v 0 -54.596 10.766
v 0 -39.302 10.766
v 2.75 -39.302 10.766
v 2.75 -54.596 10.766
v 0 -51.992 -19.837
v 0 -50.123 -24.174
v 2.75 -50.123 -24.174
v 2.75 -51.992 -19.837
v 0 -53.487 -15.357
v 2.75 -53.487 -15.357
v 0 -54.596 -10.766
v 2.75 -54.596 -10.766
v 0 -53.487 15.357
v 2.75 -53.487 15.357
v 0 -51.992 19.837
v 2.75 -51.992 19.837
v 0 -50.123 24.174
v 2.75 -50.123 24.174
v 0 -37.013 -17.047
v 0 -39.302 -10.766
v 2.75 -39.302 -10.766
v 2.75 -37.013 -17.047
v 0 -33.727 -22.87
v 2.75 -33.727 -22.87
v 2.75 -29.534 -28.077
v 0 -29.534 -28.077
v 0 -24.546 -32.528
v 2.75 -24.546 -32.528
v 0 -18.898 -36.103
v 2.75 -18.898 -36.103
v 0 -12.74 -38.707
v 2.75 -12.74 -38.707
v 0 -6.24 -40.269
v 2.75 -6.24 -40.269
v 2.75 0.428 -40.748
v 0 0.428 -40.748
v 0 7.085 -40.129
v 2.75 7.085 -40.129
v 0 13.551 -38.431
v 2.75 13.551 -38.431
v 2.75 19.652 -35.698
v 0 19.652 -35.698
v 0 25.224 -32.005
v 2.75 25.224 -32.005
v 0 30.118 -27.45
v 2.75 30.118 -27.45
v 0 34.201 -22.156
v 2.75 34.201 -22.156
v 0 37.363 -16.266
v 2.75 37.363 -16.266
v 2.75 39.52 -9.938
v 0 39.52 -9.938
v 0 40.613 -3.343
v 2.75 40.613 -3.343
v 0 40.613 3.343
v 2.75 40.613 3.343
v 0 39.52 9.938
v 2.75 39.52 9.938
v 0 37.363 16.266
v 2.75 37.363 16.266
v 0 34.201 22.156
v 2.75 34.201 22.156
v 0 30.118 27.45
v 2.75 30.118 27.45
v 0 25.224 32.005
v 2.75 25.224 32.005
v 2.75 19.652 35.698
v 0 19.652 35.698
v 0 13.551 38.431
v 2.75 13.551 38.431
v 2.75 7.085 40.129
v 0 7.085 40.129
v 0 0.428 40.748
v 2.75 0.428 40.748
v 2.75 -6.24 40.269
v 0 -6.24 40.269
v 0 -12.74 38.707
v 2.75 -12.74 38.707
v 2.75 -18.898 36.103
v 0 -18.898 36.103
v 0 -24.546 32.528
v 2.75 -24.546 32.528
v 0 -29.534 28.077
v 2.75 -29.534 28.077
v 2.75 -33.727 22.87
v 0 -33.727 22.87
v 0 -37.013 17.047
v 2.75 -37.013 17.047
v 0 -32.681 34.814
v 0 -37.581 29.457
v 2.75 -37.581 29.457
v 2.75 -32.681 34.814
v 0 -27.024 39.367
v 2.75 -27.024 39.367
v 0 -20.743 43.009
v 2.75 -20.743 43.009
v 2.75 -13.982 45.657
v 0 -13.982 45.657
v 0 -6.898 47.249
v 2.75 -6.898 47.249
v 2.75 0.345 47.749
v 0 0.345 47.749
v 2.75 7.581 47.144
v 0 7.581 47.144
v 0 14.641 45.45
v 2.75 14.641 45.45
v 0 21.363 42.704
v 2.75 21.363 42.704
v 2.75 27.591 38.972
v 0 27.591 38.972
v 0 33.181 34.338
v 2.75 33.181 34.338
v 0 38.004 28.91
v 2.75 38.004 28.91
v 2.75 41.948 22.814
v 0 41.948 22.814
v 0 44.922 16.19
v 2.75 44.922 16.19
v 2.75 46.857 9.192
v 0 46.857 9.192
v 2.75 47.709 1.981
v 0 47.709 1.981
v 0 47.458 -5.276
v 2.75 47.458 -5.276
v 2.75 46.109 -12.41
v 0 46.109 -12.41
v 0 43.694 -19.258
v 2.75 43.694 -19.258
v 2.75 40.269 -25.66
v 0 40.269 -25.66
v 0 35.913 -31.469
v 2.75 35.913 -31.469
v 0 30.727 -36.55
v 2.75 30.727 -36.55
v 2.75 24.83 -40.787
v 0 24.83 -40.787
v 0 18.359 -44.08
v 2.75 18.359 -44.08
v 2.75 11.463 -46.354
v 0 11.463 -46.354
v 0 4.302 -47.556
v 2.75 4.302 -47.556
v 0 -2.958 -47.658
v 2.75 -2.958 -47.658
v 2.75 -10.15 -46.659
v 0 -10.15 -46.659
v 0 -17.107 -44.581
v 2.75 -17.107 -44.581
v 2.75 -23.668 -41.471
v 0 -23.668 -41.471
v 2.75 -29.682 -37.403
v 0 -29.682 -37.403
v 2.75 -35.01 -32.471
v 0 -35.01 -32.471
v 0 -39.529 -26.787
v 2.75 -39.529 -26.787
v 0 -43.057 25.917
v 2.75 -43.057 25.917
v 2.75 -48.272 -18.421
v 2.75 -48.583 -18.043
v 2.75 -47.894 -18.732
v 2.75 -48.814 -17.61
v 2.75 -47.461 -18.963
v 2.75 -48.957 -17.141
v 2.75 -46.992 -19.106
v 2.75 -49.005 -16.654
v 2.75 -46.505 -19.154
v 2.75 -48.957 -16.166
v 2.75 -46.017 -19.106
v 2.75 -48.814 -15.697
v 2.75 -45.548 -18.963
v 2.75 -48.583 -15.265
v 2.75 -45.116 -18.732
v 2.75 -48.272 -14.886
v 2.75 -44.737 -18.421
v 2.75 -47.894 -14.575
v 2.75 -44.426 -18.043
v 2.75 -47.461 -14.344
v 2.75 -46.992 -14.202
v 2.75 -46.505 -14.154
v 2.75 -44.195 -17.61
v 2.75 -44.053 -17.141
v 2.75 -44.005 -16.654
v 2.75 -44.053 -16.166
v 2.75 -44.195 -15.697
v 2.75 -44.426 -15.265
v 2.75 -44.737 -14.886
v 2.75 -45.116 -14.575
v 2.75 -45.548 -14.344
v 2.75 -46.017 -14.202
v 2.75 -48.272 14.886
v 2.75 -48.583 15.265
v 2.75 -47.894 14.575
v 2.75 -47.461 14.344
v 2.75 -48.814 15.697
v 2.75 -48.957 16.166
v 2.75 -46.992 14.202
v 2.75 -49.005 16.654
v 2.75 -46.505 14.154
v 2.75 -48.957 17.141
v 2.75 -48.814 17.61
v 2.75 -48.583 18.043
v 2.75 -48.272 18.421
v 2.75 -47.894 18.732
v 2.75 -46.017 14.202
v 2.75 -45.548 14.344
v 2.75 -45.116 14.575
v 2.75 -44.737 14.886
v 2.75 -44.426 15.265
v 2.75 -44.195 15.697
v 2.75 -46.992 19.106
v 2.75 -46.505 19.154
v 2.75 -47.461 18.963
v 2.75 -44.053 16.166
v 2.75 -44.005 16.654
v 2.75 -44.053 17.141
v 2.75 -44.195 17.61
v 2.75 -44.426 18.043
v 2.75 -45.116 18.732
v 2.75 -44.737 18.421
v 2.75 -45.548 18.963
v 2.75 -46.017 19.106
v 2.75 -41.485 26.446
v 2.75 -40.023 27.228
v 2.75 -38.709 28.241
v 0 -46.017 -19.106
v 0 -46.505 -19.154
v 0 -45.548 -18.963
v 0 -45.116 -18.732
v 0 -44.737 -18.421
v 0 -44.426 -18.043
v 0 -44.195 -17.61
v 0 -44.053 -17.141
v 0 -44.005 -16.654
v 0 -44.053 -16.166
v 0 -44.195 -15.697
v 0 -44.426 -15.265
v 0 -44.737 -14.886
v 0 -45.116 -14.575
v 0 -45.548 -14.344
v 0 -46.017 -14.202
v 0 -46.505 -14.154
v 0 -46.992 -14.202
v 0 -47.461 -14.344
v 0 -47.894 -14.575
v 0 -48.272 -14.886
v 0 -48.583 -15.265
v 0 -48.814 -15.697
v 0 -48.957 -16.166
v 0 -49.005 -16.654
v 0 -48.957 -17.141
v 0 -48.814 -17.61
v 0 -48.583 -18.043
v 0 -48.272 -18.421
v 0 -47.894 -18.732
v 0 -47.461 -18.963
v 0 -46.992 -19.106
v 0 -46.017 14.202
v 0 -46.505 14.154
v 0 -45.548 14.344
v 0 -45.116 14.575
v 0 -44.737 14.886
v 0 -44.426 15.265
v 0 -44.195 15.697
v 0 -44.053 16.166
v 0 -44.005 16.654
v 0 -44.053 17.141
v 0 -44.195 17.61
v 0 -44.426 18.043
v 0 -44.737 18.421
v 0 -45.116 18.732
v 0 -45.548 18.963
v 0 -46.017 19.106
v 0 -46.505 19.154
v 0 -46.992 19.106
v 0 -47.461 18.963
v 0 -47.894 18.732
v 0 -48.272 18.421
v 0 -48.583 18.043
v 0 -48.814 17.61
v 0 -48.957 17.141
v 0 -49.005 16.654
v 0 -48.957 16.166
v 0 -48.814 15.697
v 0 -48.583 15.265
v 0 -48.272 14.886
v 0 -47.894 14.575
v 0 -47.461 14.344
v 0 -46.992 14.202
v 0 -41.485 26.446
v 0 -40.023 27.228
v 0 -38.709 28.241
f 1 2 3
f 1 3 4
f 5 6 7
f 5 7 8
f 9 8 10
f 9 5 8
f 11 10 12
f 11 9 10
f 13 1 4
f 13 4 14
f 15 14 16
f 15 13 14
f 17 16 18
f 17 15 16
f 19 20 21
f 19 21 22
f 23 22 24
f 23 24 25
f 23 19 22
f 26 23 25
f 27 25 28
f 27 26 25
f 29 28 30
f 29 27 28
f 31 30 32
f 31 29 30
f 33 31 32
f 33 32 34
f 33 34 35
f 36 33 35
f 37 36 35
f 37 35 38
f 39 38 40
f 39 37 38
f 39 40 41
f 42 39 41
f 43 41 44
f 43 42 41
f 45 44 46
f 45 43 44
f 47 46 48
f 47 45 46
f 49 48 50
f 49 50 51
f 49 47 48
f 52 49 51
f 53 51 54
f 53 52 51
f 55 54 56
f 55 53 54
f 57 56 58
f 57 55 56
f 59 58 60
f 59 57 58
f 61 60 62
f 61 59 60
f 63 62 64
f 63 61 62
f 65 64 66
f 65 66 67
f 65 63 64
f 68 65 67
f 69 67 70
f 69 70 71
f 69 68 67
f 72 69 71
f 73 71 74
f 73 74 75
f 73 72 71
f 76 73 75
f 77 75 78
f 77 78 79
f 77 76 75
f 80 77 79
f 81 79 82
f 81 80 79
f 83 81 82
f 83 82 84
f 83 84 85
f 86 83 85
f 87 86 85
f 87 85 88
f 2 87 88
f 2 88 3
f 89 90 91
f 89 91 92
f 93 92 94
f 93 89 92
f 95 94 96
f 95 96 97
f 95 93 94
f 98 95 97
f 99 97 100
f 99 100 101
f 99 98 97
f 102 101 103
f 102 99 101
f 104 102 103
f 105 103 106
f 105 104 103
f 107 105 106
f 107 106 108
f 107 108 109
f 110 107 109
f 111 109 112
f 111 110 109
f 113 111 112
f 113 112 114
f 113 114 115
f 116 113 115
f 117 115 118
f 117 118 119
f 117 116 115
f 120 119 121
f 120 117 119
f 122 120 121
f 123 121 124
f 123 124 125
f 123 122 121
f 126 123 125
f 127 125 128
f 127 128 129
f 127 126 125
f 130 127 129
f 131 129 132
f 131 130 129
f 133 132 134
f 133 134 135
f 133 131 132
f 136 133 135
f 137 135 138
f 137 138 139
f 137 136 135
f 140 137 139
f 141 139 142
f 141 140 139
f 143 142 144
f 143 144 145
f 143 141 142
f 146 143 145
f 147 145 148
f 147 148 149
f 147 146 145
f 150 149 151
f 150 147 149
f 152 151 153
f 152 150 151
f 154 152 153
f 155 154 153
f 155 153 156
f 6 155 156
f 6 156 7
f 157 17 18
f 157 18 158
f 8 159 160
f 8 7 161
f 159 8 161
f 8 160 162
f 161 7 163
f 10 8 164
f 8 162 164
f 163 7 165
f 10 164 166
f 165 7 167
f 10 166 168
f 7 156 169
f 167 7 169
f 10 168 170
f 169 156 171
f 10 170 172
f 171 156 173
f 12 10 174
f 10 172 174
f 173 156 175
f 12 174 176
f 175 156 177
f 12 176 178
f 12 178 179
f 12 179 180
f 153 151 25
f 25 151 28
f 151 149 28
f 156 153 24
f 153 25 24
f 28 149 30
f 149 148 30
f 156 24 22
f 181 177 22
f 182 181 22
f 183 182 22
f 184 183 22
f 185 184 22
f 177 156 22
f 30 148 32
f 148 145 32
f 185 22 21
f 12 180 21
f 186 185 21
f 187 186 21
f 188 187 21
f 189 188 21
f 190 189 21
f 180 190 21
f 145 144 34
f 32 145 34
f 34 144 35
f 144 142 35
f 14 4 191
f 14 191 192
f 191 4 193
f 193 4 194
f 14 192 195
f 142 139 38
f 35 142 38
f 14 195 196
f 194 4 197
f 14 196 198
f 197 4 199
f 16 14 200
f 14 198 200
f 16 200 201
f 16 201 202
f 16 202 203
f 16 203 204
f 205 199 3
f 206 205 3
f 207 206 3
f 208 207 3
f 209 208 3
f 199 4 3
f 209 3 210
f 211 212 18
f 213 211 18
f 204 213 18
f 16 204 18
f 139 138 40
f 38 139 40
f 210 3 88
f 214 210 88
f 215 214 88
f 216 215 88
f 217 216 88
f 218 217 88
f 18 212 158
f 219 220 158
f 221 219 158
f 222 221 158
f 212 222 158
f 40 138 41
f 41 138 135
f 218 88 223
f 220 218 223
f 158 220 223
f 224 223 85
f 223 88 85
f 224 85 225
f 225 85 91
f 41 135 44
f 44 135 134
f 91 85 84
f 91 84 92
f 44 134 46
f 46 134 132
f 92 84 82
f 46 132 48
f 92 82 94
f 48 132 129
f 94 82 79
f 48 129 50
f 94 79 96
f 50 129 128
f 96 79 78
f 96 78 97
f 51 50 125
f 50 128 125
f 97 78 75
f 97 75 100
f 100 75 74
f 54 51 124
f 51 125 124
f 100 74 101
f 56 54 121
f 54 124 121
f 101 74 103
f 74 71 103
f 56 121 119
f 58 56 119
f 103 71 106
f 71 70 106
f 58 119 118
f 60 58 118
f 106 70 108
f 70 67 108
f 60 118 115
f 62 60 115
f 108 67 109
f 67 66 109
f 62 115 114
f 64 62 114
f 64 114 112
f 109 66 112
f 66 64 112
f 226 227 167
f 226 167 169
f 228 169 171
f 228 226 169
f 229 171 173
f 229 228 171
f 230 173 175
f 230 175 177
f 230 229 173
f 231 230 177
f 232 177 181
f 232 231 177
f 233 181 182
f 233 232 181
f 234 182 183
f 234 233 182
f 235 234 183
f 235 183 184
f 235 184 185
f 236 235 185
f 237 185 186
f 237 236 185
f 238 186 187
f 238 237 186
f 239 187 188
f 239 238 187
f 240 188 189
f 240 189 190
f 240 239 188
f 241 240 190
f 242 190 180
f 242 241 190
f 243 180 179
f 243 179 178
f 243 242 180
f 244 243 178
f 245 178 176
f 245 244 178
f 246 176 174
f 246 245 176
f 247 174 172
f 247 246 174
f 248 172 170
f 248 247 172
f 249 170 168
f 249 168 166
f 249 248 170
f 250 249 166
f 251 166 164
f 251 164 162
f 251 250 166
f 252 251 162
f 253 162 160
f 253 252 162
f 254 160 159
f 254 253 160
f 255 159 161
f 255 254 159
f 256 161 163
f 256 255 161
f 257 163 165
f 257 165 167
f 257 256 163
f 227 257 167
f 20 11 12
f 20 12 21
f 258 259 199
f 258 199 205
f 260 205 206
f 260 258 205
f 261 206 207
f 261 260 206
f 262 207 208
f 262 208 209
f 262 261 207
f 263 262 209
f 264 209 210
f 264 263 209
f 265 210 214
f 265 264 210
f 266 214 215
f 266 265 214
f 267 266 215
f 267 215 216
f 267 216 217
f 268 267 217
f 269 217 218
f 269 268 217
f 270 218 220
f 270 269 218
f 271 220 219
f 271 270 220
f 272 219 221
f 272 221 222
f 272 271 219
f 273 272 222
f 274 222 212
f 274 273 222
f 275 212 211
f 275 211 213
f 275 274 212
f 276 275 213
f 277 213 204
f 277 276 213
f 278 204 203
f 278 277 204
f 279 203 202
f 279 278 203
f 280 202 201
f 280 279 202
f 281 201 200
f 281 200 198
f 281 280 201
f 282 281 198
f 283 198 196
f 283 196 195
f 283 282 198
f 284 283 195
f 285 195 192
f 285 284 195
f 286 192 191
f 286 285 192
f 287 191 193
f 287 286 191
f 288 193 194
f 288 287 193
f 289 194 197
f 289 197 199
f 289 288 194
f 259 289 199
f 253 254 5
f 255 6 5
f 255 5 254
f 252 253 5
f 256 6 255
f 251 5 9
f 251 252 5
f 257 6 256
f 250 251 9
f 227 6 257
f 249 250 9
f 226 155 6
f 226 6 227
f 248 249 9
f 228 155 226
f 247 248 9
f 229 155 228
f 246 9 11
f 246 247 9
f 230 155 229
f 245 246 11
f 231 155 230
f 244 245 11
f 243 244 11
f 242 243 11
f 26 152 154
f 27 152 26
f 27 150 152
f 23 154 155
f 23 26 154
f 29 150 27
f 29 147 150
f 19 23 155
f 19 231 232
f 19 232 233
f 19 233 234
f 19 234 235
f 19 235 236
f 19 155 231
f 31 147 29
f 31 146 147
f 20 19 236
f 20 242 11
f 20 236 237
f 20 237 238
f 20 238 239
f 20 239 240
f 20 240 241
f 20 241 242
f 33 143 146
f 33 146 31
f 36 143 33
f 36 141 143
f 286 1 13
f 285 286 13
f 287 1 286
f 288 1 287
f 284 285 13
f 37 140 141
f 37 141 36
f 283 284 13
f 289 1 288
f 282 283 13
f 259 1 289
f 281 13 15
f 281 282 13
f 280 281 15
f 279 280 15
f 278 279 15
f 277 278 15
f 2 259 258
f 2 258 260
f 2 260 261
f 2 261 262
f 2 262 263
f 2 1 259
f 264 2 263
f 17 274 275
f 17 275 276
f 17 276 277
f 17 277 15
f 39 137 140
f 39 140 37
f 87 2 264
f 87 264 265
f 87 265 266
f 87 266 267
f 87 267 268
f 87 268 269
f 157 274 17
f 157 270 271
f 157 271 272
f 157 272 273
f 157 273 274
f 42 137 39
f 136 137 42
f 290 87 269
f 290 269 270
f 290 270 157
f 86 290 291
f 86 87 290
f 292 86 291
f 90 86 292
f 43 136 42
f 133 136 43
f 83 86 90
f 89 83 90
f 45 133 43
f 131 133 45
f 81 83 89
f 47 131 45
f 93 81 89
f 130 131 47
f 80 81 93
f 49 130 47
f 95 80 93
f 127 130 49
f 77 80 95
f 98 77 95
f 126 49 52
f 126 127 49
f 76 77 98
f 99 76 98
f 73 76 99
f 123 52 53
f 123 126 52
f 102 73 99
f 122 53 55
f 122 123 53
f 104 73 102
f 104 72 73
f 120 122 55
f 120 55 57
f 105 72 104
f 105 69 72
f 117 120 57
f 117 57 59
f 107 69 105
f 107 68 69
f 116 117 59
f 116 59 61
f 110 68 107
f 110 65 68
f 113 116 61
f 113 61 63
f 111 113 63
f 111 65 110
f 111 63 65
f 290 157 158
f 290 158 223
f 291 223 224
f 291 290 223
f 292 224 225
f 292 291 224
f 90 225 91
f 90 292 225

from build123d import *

# Parameters (mm, degrees)
ESQUISSE1_R        = 2.5
BOSS_EXTRU_1_DEPTH = 2.75


with BuildPart() as part:
    # Esquisse1 → Boss.-Extru.1 (new body)
    with BuildSketch(Plane(origin=(0, 0, 0), x_dir=(0, 0, -1), z_dir=(1, 0, 0))):
        with BuildLine():
            ThreePointArc((-25.916566448, -43.057123424), (-27.227783117, -40.022676723), (-29.456638889, -37.581497115))
            ThreePointArc((-29.456638889, -37.581497115), (1.652244952, 47.721405958), (26.786870524, -39.528800482))
            Line((26.786870524, -39.528800482), (24.173691188, -50.122960456))
            ThreePointArc((24.173691188, -50.122960456), (17.612583106, -52.787076324), (10.766267997, -54.596391675))
            Line((10.766267997, -54.596391675), (10.766267997, -39.302035233))
            ThreePointArc((10.766267997, -39.302035233), (0, 40.75), (-10.766267997, -39.302035233))
            Line((-10.766267997, -39.302035233), (-10.766267997, -54.596391675))
            ThreePointArc((-10.766267997, -54.596391675), (-17.612583106, -52.787076324), (-24.173691188, -50.122960456))
            Line((-24.173691188, -50.122960456), (-25.916566448, -43.057123424))
        make_face()
        with Locations((-16.653577526, -46.504624781)):
            Circle(ESQUISSE1_R, mode=Mode.SUBTRACT)
        with Locations((16.653577526, -46.504624781)):
            Circle(ESQUISSE1_R, mode=Mode.SUBTRACT)
    extrude(amount=BOSS_EXTRU_1_DEPTH)


solid = part.part
